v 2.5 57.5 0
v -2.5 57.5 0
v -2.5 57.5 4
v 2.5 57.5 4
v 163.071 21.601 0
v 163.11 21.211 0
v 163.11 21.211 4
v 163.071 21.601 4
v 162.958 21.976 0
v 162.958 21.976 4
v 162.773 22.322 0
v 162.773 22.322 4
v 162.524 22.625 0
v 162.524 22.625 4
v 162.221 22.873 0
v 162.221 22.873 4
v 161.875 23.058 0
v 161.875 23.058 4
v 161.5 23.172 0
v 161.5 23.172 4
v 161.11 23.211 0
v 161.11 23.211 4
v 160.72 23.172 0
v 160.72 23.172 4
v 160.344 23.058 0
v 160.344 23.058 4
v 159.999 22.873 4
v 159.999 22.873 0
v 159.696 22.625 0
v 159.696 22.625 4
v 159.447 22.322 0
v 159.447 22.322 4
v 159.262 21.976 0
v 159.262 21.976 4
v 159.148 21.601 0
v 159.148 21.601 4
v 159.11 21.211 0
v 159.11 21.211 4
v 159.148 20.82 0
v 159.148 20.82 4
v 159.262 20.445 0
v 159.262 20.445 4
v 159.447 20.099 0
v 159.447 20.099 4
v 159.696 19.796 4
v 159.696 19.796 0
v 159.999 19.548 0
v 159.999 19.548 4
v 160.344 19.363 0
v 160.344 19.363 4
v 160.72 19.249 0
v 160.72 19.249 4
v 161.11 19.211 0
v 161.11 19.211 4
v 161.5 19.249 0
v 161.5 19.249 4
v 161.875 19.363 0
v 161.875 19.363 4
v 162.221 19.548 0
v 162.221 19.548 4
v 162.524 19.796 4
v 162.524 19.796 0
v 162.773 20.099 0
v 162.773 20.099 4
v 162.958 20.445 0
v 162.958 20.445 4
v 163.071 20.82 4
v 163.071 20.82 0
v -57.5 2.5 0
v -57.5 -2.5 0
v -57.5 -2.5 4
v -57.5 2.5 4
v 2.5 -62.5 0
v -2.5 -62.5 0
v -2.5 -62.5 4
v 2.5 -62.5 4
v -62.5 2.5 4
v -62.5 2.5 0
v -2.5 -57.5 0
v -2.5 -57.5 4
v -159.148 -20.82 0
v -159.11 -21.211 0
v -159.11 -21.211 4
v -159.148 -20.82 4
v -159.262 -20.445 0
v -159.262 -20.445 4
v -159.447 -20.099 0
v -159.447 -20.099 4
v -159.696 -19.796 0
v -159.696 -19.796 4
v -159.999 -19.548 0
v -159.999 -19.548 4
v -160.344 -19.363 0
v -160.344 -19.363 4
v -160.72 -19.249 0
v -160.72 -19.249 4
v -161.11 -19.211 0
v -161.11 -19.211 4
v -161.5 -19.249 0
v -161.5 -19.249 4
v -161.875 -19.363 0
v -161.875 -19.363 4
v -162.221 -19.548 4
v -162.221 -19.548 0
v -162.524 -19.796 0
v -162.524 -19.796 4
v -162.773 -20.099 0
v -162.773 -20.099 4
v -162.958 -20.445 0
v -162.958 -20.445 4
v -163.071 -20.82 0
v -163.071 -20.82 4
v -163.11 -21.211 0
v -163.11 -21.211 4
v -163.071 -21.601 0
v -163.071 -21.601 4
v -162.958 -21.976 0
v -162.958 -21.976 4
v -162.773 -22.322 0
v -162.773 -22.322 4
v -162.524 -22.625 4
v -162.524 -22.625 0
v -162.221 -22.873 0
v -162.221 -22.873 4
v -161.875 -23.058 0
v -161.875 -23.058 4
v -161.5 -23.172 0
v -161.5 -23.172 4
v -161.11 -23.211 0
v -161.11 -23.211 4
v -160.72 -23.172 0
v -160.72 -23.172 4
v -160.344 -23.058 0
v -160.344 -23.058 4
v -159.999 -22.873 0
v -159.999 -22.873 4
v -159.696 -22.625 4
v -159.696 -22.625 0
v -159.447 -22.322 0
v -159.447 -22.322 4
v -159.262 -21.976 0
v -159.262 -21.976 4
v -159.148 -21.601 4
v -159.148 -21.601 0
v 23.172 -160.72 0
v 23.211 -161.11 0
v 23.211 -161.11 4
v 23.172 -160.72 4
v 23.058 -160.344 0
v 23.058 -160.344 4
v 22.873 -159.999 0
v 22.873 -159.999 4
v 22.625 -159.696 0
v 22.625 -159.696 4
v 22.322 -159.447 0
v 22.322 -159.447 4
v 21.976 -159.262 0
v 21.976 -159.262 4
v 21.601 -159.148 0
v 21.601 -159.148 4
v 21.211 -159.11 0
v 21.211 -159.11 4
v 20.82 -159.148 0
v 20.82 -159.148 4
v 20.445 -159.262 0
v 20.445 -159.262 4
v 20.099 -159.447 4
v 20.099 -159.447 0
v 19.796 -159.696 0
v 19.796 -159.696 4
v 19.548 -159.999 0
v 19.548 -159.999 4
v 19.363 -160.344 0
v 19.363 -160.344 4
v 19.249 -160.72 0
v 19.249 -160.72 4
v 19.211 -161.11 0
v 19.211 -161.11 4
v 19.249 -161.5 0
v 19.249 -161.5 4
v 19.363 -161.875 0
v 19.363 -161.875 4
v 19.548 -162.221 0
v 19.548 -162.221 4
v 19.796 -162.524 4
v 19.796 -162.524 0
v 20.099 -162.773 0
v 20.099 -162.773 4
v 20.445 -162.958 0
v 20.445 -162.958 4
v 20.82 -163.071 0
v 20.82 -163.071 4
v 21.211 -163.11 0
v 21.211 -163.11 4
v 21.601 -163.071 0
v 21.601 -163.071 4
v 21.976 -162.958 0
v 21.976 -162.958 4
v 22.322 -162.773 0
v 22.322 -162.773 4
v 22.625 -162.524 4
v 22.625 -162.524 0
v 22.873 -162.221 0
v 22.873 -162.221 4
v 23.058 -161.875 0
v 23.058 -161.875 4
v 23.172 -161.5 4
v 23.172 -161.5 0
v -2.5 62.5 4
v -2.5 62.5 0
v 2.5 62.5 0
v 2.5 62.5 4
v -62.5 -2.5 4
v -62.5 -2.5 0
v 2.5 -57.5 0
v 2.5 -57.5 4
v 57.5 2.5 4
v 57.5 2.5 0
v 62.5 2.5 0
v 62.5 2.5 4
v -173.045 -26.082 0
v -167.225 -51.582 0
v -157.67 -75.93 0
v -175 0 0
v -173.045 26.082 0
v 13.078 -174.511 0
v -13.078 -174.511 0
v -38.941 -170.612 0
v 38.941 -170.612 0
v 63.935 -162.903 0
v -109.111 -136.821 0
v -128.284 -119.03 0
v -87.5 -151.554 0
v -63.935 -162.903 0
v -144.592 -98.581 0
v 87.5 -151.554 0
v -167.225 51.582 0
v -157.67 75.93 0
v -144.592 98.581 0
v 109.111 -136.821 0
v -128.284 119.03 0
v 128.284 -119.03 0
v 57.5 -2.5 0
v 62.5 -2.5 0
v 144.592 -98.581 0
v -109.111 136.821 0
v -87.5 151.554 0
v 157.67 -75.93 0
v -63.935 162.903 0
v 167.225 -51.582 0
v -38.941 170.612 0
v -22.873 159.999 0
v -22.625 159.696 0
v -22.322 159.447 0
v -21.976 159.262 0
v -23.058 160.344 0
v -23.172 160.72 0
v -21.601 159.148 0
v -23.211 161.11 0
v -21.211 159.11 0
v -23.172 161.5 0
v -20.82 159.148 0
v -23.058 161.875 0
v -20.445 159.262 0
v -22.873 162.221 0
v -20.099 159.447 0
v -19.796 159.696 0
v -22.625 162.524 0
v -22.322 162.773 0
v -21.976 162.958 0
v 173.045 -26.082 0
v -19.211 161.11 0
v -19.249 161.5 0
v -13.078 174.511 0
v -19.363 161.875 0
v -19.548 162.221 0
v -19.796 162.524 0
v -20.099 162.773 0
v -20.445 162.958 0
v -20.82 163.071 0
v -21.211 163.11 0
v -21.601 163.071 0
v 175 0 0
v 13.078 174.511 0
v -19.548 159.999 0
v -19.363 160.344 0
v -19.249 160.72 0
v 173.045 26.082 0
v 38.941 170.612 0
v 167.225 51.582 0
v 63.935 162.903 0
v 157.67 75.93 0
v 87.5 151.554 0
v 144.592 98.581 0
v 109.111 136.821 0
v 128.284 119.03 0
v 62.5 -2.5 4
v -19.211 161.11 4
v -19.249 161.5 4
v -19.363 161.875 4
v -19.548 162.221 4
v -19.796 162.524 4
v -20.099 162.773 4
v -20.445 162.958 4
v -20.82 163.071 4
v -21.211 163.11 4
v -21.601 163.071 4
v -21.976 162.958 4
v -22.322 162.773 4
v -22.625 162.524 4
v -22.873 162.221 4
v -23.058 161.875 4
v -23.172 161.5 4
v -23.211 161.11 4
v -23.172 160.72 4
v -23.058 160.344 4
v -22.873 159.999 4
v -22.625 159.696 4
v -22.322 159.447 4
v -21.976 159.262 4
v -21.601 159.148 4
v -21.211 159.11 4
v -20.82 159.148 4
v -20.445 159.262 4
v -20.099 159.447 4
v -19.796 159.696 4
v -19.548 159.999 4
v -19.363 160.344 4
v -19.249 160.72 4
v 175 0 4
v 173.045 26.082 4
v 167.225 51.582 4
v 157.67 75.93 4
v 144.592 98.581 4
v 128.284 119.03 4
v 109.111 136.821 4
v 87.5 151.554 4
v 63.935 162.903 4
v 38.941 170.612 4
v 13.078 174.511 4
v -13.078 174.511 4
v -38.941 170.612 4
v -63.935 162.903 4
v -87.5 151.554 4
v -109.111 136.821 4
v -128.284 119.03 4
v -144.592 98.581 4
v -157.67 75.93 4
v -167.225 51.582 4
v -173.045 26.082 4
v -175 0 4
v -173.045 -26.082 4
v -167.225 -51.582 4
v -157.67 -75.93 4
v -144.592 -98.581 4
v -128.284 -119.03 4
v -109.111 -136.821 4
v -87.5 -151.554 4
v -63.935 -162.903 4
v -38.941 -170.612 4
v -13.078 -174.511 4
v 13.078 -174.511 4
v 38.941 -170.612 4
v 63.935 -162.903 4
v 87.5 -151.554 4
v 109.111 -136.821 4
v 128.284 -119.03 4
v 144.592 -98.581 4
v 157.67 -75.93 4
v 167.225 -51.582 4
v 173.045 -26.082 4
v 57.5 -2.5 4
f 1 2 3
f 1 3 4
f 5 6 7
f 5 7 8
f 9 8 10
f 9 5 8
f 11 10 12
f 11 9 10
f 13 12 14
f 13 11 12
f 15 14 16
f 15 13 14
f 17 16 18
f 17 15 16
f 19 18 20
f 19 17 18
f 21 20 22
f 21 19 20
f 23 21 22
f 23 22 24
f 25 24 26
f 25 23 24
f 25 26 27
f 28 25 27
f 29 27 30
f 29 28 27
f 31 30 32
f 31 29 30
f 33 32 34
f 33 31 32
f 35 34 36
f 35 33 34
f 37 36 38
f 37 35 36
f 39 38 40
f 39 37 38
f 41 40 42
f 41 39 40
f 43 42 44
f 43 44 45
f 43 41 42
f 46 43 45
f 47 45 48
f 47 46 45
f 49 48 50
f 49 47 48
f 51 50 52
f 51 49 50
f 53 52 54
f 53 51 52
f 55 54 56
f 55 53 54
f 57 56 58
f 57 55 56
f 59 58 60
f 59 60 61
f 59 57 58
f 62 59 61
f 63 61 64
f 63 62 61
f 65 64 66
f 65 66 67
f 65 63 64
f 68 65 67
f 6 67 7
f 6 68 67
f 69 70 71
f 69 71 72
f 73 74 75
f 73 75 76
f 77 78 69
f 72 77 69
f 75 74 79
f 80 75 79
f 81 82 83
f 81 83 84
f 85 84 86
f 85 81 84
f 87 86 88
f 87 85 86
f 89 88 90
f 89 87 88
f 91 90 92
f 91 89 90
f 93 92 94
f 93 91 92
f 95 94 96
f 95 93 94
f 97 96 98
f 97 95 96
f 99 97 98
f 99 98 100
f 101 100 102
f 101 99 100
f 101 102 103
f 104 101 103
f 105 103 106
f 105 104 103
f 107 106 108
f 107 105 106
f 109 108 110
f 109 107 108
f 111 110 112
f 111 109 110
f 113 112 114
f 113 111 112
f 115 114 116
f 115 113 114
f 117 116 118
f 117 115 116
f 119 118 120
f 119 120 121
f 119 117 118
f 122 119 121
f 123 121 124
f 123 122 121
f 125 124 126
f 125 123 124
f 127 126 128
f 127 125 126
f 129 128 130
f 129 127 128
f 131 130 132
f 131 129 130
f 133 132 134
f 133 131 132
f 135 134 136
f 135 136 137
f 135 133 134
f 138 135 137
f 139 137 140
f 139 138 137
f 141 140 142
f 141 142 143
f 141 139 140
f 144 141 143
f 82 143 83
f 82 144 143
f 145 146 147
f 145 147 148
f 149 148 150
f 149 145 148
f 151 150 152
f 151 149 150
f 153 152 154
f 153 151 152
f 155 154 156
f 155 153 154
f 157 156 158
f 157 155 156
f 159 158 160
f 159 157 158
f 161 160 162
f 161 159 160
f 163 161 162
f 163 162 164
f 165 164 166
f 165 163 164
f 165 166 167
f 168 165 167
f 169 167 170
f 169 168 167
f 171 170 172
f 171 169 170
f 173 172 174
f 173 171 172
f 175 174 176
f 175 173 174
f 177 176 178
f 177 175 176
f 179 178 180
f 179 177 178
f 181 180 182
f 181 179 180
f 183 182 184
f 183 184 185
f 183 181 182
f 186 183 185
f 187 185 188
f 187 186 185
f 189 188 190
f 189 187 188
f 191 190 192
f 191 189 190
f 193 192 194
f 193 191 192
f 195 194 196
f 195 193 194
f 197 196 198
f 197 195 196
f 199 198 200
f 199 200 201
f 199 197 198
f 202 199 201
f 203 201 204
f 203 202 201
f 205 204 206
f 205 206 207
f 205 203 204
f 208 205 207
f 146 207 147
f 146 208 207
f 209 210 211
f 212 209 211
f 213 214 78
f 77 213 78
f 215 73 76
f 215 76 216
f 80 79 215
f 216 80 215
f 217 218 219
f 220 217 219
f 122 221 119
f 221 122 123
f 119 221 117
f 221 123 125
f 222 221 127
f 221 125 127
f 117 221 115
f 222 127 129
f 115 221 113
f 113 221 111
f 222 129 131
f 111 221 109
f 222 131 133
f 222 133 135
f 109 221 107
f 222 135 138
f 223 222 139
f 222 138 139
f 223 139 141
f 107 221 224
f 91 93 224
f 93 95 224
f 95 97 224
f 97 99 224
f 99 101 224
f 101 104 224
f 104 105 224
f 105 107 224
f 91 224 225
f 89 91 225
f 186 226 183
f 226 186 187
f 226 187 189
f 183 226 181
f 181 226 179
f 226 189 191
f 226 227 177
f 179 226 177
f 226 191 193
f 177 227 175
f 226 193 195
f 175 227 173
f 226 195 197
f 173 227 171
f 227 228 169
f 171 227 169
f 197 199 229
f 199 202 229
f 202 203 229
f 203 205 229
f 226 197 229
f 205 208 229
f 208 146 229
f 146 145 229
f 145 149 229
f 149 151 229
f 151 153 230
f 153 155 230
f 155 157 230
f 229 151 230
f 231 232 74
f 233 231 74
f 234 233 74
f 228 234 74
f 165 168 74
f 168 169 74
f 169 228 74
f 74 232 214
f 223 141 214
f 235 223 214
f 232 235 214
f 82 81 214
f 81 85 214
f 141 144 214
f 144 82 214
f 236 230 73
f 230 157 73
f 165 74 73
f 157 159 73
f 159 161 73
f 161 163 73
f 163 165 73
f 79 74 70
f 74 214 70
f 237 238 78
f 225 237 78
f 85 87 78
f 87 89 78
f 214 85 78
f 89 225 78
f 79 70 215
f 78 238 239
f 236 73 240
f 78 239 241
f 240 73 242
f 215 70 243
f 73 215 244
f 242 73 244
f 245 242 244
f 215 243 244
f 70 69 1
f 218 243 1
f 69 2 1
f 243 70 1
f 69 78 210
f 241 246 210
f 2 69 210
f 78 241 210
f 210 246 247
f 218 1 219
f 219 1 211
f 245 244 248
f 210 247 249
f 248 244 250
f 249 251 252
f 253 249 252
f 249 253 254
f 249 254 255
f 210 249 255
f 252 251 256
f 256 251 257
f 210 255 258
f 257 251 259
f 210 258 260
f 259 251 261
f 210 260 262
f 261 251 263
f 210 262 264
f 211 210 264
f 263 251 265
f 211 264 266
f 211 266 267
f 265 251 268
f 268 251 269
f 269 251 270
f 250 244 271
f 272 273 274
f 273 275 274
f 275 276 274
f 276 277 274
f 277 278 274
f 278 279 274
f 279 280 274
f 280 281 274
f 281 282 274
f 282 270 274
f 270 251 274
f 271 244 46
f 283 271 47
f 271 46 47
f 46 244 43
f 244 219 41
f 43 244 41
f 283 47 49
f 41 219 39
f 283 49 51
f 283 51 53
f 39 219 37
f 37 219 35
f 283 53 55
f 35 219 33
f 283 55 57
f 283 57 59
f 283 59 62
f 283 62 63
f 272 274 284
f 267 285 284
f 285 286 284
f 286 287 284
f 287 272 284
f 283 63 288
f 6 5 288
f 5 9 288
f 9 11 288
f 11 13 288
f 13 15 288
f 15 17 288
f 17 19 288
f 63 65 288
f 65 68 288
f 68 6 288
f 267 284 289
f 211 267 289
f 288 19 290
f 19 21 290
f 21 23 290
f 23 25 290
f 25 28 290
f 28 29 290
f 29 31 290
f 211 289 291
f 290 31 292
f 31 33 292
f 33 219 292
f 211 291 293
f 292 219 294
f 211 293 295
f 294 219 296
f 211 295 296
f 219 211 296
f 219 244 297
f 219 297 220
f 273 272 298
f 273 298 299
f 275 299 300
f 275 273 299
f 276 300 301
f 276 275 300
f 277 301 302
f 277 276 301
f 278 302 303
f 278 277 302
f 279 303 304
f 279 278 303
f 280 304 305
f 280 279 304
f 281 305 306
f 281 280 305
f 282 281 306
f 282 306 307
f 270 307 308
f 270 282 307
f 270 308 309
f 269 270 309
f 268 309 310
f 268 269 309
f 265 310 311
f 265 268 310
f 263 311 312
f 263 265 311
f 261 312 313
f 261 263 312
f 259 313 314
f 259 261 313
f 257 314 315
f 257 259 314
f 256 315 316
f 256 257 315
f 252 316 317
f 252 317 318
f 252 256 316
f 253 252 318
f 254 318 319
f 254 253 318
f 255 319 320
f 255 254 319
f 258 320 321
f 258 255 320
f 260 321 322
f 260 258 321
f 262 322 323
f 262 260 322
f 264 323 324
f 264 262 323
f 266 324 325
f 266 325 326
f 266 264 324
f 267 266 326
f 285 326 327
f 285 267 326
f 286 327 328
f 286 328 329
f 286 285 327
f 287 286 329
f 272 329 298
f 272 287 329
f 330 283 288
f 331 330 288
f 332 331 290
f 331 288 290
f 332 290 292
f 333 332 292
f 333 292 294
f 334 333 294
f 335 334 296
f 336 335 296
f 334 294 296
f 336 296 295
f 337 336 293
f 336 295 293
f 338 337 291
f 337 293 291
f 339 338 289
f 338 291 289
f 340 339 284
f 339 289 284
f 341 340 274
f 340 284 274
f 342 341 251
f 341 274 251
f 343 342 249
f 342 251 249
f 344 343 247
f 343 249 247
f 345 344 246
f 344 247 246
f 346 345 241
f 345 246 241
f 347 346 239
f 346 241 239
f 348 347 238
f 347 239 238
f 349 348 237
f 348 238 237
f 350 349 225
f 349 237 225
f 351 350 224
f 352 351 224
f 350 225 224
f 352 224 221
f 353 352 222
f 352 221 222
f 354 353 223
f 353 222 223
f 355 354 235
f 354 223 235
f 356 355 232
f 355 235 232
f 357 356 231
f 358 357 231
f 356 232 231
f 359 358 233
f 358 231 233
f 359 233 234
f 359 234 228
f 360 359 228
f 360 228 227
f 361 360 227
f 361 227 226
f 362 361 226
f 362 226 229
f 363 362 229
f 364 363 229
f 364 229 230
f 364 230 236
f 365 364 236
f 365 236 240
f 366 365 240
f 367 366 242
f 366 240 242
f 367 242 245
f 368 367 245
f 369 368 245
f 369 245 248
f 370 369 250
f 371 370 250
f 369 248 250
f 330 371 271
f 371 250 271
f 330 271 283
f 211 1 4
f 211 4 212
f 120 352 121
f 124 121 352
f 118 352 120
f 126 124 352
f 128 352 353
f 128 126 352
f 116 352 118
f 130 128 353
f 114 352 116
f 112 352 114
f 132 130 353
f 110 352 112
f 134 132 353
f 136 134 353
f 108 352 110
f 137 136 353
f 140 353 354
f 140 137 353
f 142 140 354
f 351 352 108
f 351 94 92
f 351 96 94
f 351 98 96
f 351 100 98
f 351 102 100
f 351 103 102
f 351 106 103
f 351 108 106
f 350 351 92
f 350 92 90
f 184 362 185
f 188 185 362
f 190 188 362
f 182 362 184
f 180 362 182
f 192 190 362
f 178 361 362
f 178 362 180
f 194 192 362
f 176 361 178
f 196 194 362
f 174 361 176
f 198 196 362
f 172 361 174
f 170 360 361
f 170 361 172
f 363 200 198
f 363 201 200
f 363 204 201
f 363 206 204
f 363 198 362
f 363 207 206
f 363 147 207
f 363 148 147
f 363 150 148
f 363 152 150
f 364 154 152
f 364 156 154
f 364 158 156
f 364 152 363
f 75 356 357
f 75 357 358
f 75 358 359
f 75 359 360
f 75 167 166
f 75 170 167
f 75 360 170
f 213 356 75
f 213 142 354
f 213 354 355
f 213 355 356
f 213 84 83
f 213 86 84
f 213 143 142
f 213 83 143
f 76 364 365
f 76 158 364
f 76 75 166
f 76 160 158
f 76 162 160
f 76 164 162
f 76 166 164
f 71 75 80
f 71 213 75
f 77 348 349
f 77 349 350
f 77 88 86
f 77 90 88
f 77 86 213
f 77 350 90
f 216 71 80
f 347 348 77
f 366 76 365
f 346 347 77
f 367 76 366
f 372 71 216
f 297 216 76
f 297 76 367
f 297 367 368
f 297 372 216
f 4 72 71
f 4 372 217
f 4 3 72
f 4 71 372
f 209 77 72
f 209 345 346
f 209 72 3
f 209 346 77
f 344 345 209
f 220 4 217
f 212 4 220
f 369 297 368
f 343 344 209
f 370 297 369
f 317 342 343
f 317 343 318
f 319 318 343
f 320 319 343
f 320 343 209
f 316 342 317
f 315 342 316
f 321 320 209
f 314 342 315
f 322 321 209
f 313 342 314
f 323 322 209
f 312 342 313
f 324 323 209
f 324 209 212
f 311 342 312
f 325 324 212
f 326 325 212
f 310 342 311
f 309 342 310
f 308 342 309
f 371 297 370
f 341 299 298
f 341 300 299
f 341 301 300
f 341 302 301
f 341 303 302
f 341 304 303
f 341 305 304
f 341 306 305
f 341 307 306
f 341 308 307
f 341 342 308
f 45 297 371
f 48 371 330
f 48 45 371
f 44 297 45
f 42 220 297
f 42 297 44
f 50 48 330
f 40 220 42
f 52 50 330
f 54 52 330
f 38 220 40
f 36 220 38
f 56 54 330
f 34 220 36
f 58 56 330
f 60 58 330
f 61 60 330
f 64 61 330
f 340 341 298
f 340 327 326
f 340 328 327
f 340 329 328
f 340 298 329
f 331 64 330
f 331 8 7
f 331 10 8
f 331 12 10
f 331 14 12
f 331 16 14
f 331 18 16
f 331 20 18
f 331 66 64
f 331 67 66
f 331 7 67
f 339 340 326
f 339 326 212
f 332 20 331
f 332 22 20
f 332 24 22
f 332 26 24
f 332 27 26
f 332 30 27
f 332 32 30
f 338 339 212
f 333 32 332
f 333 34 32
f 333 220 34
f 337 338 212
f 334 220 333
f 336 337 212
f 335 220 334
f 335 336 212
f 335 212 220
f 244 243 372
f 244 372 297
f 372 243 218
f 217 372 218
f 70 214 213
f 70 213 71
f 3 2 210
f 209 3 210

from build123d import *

# Parameters (mm, degrees)
F0_R     = 175
F0_R_2   = 2
F0_W     = 5
F0_H     = 5
F1_DEPTH = 4


with BuildPart() as f1:
    # F0 (on Top) → F1 (new body)
    with BuildSketch(Plane.XY):
        Circle(F0_R)
        with Locations((-161.10979, -21.210506)):
            Circle(F0_R_2, mode=Mode.SUBTRACT)
        with Locations((21.210506, -161.10979)):
            Circle(F0_R_2, mode=Mode.SUBTRACT)
        with Locations((0, -60)):
            Rectangle(F0_W, F0_H, mode=Mode.SUBTRACT)
        with Locations((-60, 0)):
            Rectangle(F0_W, F0_H, mode=Mode.SUBTRACT)
        with Locations((-21.210506, 161.10979)):
            Circle(F0_R_2, mode=Mode.SUBTRACT)
        with Locations((60, 0)):
            Rectangle(F0_W, F0_H, mode=Mode.SUBTRACT)
        with Locations((0, 60)):
            Rectangle(F0_W, F0_H, mode=Mode.SUBTRACT)
        with Locations((161.10979, 21.210506)):
            Circle(F0_R_2, mode=Mode.SUBTRACT)
    extrude(amount=F1_DEPTH)


solid = f1.part
